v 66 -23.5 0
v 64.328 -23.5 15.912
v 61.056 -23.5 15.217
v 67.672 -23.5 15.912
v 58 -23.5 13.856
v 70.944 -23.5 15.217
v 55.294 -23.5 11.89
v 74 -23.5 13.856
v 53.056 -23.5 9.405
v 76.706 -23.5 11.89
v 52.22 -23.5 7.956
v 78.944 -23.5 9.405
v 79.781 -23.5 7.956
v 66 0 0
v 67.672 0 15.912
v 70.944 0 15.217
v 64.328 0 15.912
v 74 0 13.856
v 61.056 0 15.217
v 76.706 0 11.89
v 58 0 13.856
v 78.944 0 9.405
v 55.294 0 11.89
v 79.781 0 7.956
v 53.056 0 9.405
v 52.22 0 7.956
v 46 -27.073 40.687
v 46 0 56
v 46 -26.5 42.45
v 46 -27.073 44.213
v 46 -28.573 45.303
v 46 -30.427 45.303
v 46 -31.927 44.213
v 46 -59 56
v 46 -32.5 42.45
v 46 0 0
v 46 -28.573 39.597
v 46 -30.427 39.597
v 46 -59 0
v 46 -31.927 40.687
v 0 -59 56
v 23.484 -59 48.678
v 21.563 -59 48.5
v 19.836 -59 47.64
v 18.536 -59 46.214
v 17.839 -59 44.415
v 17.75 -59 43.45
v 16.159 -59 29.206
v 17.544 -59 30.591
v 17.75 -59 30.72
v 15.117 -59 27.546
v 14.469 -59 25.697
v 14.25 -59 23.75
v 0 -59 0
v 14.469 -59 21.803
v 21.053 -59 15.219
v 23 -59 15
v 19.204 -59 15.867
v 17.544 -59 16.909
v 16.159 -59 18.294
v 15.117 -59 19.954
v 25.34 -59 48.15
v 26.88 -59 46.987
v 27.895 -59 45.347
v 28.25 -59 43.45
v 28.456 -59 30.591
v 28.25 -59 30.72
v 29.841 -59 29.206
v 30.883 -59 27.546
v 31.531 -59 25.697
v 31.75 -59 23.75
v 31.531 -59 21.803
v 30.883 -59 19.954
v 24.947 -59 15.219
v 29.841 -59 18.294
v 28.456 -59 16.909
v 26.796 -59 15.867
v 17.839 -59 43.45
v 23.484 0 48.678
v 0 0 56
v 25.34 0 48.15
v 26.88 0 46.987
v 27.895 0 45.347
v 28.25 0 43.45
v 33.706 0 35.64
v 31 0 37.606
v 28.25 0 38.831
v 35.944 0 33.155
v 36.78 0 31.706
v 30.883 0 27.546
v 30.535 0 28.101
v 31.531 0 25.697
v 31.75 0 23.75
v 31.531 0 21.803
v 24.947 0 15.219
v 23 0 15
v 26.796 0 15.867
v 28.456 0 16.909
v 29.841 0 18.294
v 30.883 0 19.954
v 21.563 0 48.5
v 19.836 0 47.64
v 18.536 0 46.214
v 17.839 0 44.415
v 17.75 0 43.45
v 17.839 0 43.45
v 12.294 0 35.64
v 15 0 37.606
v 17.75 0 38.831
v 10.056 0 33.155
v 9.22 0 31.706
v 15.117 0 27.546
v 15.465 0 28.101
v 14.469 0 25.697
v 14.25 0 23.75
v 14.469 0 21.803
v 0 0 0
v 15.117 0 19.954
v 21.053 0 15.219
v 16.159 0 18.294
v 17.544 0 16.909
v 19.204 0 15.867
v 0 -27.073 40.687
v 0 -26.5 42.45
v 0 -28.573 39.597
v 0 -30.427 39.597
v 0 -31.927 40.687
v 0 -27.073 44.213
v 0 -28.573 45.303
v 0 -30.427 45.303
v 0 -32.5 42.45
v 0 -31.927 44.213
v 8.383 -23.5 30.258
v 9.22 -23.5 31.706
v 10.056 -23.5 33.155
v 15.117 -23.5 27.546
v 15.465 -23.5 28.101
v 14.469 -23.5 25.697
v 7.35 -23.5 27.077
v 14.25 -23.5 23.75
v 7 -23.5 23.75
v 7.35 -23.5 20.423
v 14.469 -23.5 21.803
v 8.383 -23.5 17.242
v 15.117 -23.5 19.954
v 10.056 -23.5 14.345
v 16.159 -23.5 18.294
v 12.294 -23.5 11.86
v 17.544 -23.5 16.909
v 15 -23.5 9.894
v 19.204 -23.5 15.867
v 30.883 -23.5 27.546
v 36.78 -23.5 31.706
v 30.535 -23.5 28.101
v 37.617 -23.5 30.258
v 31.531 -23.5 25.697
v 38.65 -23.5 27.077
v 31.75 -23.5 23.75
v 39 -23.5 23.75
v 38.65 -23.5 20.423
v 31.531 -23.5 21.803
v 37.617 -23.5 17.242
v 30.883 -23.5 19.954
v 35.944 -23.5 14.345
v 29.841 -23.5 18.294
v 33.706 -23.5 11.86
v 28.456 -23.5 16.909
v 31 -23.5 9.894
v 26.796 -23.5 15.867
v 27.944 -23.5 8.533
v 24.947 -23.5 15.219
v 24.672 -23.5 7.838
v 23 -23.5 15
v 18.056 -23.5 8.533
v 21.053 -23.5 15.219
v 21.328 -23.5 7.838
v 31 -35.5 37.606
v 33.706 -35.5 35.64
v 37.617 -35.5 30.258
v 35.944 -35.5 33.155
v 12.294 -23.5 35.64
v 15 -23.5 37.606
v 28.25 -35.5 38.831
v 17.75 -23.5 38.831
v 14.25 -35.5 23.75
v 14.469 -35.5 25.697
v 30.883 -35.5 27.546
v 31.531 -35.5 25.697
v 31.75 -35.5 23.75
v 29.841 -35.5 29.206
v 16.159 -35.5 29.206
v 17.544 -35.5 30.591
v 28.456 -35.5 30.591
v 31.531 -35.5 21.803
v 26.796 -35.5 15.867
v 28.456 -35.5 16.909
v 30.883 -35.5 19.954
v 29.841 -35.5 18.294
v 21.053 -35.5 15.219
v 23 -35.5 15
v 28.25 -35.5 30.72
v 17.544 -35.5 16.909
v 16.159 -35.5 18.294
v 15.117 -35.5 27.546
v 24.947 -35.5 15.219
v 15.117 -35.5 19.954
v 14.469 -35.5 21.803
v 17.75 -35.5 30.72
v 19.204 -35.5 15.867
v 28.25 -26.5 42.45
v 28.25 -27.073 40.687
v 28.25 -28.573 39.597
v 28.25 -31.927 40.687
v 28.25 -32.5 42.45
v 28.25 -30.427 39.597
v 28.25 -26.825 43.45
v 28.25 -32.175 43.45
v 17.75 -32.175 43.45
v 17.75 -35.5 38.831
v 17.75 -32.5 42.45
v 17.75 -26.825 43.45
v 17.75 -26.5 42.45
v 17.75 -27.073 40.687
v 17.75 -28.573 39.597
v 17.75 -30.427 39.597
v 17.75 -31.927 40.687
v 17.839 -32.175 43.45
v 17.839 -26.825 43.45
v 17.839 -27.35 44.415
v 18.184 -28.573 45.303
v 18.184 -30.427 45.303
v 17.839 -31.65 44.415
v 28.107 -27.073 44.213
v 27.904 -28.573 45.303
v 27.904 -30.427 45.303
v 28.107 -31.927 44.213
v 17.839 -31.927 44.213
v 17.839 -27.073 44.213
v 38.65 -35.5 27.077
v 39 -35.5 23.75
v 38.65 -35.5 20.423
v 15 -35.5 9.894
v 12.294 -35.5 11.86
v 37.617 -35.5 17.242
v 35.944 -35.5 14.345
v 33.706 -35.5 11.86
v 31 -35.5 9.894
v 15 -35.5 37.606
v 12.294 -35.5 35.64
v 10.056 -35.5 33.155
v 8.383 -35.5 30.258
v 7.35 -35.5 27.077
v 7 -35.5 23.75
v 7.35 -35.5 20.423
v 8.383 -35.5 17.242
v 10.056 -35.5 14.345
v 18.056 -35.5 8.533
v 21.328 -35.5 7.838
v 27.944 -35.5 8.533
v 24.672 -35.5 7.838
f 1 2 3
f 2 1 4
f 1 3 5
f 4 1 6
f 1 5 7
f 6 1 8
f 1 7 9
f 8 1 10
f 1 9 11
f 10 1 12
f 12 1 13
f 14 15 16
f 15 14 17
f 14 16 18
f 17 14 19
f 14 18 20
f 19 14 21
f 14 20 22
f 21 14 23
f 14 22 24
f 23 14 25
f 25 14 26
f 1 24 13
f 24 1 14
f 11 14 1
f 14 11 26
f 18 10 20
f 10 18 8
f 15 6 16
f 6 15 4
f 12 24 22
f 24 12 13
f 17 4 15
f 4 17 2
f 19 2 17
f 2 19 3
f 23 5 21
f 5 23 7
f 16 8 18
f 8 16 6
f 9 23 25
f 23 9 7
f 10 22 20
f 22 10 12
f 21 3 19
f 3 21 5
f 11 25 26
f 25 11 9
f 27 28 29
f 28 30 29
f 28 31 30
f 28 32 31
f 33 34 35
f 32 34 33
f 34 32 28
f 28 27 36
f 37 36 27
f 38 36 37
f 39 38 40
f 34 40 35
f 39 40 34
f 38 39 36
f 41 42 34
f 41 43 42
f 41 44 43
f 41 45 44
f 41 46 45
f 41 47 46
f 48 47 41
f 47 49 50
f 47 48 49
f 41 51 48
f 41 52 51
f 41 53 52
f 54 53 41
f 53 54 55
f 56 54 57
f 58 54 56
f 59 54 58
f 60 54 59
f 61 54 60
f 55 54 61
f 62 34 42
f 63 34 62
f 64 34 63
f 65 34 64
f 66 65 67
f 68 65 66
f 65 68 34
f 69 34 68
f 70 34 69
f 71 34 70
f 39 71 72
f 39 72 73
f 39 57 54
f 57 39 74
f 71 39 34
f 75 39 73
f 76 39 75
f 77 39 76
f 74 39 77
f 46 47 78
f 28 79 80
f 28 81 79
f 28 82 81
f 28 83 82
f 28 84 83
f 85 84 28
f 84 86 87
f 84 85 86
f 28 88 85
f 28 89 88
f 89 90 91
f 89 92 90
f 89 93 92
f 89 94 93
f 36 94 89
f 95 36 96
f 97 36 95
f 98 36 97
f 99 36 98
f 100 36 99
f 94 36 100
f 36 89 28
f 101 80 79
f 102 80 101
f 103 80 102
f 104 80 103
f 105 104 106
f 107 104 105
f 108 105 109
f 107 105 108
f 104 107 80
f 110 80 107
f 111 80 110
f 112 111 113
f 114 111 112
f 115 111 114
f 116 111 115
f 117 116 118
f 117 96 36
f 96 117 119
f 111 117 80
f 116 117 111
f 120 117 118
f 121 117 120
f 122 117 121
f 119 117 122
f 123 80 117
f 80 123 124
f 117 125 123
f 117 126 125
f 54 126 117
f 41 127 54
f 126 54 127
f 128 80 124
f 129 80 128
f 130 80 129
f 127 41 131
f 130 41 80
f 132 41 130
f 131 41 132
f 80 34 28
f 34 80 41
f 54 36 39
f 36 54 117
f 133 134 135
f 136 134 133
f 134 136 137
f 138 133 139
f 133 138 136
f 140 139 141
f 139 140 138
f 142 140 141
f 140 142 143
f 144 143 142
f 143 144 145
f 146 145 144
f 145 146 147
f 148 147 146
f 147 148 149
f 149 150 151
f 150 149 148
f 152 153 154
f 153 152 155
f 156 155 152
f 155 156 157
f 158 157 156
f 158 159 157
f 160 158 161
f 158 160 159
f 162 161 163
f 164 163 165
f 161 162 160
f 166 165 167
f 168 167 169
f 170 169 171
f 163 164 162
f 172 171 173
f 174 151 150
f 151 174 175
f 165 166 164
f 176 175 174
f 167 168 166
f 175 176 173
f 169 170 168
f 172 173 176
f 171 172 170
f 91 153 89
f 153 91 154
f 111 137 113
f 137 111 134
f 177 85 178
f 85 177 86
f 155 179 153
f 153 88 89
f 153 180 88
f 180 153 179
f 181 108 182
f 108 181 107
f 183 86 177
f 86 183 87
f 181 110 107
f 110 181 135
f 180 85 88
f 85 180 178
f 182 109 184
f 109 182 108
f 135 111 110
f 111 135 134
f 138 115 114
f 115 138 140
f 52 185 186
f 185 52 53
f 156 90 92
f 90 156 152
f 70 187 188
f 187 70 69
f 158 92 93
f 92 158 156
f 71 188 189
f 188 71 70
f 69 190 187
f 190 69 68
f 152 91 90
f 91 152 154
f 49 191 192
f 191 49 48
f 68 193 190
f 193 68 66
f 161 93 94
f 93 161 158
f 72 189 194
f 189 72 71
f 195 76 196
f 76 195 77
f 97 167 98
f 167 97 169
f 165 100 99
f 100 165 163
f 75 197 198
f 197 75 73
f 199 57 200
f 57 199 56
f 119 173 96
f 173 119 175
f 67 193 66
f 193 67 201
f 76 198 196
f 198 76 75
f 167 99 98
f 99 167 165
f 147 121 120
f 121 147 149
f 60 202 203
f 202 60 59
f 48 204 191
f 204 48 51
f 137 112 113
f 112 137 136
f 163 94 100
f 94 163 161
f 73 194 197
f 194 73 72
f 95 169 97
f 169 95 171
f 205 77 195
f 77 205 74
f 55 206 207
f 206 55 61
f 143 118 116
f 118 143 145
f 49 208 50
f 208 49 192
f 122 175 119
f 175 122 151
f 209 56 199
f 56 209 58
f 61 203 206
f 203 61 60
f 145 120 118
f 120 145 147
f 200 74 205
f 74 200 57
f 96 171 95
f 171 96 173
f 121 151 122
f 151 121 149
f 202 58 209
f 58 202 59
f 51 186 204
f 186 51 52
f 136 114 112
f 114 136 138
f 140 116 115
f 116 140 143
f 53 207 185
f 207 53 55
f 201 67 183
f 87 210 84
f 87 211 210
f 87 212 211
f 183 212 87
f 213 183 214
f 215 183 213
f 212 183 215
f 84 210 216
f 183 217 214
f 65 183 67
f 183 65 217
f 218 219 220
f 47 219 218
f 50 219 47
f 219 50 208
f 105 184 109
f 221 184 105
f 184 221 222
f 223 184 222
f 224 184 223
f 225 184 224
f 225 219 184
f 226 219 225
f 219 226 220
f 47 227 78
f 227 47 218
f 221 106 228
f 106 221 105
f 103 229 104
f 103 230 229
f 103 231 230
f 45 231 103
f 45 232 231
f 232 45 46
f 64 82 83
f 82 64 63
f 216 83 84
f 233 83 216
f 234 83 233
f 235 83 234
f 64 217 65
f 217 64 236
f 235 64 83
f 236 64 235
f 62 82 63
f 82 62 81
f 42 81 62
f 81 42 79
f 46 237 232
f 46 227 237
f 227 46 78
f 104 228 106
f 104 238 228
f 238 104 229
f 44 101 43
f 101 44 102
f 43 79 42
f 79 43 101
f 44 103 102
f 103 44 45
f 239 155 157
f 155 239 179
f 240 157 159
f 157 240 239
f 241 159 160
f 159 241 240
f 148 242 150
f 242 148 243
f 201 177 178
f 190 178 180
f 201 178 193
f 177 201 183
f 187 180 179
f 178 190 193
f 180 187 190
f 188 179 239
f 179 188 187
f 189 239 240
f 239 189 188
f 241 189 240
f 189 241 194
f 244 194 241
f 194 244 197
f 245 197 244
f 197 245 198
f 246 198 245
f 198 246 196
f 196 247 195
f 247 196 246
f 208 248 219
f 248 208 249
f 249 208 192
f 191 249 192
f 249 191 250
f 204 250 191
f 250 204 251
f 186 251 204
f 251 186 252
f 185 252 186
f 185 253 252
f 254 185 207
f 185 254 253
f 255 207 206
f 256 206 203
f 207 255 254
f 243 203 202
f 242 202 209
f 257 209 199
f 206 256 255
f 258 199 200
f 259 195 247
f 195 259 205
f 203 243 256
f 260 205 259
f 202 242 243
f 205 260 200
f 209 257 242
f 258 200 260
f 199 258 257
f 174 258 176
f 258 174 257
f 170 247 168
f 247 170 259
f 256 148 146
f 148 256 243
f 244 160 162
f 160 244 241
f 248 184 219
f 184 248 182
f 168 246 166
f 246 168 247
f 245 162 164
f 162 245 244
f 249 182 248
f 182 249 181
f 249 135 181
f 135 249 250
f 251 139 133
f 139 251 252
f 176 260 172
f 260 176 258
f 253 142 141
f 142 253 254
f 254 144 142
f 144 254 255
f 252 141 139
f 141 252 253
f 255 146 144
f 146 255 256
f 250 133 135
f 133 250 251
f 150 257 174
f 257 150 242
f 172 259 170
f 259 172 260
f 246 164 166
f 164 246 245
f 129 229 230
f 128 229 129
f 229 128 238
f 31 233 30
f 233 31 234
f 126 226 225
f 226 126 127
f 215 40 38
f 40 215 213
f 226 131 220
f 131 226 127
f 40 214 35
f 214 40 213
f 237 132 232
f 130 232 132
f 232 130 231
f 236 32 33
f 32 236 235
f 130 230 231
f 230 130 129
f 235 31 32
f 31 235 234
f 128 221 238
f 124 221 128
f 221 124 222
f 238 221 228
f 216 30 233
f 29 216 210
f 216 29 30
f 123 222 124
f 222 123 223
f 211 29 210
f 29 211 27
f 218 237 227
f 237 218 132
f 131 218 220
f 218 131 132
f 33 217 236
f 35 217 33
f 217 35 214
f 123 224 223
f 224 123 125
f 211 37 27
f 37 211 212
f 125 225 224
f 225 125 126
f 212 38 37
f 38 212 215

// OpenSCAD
// Units = mm

blockZ = 59;
blockX = 46;
blockY = 56;

//** REV7AB: 0.1mm clearance from nominal at each inside face, centered actuator box and moved it higher, made prisms bigger to avoid overhang
//** REV7AC: 0.15mm clearance from nominal at each inside face, moving the bottom edge of the actuator insertion box down a bit for more clearance near the sleeve
//** REV7AD: even more clearance for cylinder height, probably to account for extra filament being deposited by printing the bridge closure without support.
//** REV7AE: even more clearance needed to account for machine non-straightness and unexpectedly larger size of other cylinders (+1mm on each edge that touches the cylinder)
//** REV7AF: moving the screw mounting hole down a bit so it aligns with the thread of an inserted core.
//** REV7AG: cleaning up code
//** -------
//** REV7BA: changing the actuator insertion cutout to a sector of the inner actuator rotation space.

//keywayRadius = 8.75;    //*** REV 7A (8.5 nominal, actual core measures 8.4)
//keywayRadius = 8.6;    //*** REV 7AB
//keywayRadius = 8.65;    //*** REV 7AC
keywayRadius = 8.75;    //*** REV 7AE

actuatorLength = 12;
actuatorRadius = 16;

//profileRadius = 5.5;   //*** REV 7A (5.0 nominal, actual core measures 4.9)
//profileRadius = 5.5;   //*** REV 7AB
//profileRadius = 5.15;   //*** REV 7AC
profileRadius = 5.25;   //*** REV 7AE

//profileHeight = 34;    //*** REV 7A (33.0 nominal, actual core measures 32.9 at highest mutilated spot, probably machined to 32.8)
//profileHeight = 33.2;    //*** REV 7AB
//profileHeight = 33.3;    //*** REV 7AC
//profileHeight = 33.5;    //*** REV 7AD
profileHeight = 33.7;    //*** REV 7AE

M5ScrewR = 6/2;
M5ScrewHeadLen = 5;
M5ScrewHeadR = 9/2;

bottomOffset = 15;

module prism(l, w, h){
    polyhedron(
        points=[[0,0,0], [l,0,0], [l,w,0], [0,w,0], [0,w,h], [l,w,h]],
        faces=[[0,1,2,3],[5,4,3,2],[0,4,5,1],[0,3,4],[5,2,1]]
    );
    // preview unfolded (do not include in your function
    z = 0.08;
    separation = 2;
    border = .2;
    translate([0,w+separation,0])
        cube([l,w,z]);
    translate([0,w+separation+w+border,0])
        cube([l,h,z]);
    translate([0,w+separation+w+border+h+border,0])
        cube([l,sqrt(w*w+h*h),z]);
    translate([l+border,w+separation+w+border+h+border,0])
        polyhedron(
            points=[[0,0,0],[h,0,0],[0,sqrt(w*w+h*h),0], [0,0,z],[h,0,z],[0,sqrt(w*w+h*h),z]],
            faces=[[0,1,2], [3,5,4], [0,3,4,1], [1,4,5,2], [2,5,3,0]]
        );
    translate([0-border,w+separation+w+border+h+border,0])
        polyhedron(
            points=[[0,0,0],[0-h,0,0],[0,sqrt(w*w+h*h),0], [0,0,z],[0-h,0,z],[0,sqrt(w*w+h*h),z]],
            faces=[[1,0,2],[5,3,4],[0,1,4,3],[1,2,5,4],[2,0,3,5]]
        );
} // module prism

module sector(h, d, a1, a2) {
    if (a2 - a1 > 180) {
        difference() {
            cylinder(h=h, d=d);
            translate([0,0,-0.5]) sector(h+1, d+1, a2-360, a1); 
        }
    } else {
        difference() {
            cylinder(h=h, d=d);
            rotate([0,0,a1]) translate([-d/2, -d/2, -0.5])
                cube([d, d/2, h+1]);
            rotate([0,0,a2]) translate([-d/2, 0, -0.5])
                cube([d, d/2, h+1]);
        }
    }
} 

difference(){
    rotate(90,[1,0,0])
    difference(){
        // Outer Block
        union() {
            cube([blockX, blockY, blockZ]);
            translate([blockX+20, 0, 0])
            intersection(){
                cylinder(blockZ/2-actuatorLength/2, r=actuatorRadius);
                union(){
                    rotate([0,0,45-15]) 
                         cube([actuatorRadius,actuatorRadius,blockZ/2-actuatorLength/2]);
                    rotate([0,0,45+15]) 
                         cube([actuatorRadius,actuatorRadius,blockZ/2-actuatorLength/2]);
                }
            }

        }    

        // Profile:
        // Plug circle of profile face
        translate([blockX/2, keywayRadius+bottomOffset, 0])
            cylinder(h=blockZ, r1=keywayRadius, r2=keywayRadius, center=false);
        
        // Mid-section of profile face
        translate([blockX/2-profileRadius,keywayRadius+bottomOffset,0])
            cube([profileRadius*2, profileHeight-keywayRadius-profileRadius, blockZ], false);
    
        // Top arch of profile face
        translate([blockX/2, profileHeight+bottomOffset-profileRadius, 0])
            cylinder(h=blockZ, r1=profileRadius, r2=profileRadius, center=false);
    
        // inner cutout for actuator: enables full rotation of actuator/plug while lock is installed
        translate([blockX/2, keywayRadius+bottomOffset, blockZ/2])
            cylinder(h=actuatorLength, r1=actuatorRadius, r2=actuatorRadius, center=true);   
    
/*        // Slot for actuator insertion while locked  //*** Used to be in place for Rev 7A*, but replaced by different design in Rev 7B*
        difference() {
            //translate([blockX/2-(keywayRadius*2+8)/2, bottomOffset+12.5, 0])   //*** Rev 7AA
            //translate([blockX/2-(keywayRadius*2+6)/2, bottomOffset+12.5+2, 0])  //*** Rev 7AB: centering box, and moving it up a bit to avoid overhang
            translate([blockX/2-(keywayRadius*2+6)/2, bottomOffset+12.5+1, 0])  //***Rev 7AC: making box a bit higher and moving it down by the same amount, for better actuator clearance near the sleeve
                //cube([keywayRadius*2+6, 11, blockZ/2-actuatorLength/2]);  //***Rev 7AA
                cube([keywayRadius*2+6, 12, blockZ/2-actuatorLength/2]);  //***Rev 7AC: making box a bit higher and moving it down by the same amount, for better actuator clearance near the sleeve
        
            //translate([blockX/2-(keywayRadius*2+8)/2, bottomOffset+18.5, blockZ/2-actuatorLength/2]) //*** Rev 7AA
            translate([blockX/2-(keywayRadius*2+7)/2, bottomOffset+18.5, blockZ/2-actuatorLength/2])  //*** Rev 7AB: move prisms further out 
                rotate(90,[0,1,0])
                    //prism(blockZ/2-actuatorLength/2, 6, 6);  //*** REV 7AA
                    prism(blockZ/2-actuatorLength/2, 8, 8);  //*** REV 7AB: make prisms bigger to avoid overhang
        
            //translate([blockX/2+(keywayRadius*2+8)/2, bottomOffset+18.5, 0])  //*** REV 7AA
            translate([blockX/2+(keywayRadius*2+7)/2, bottomOffset+18.5, 0])  //*** Rev 7AB: move prisms further out
                rotate(270,[0,1,0])
                    //prism(blockZ/2-actuatorLength/2, 8, 8);  //*** Rev 7AA
                    prism(blockZ/2-actuatorLength/2, 8, 8);  //*** REV 7AB: make prisms bigger to avoid overhang
        } //difference
*/
        // New Slot for actuator insertion while locked   //*** Rev 7BA: matching a sector of the inner cutout for actuator rotation
        translate([blockX/2, keywayRadius+bottomOffset, 0])
            intersection(){
                cylinder(blockZ/2-actuatorLength/2, r=actuatorRadius);  //we take the same cylinder as for the inner cutout (albeit with simplified notation)...
                union(){                                                //but we intersect it with the union of two cubes that are rotated to form a 120 degree angle.
                    rotate([0,0,45-15]) 
                         cube([actuatorRadius,actuatorRadius,blockZ/2-actuatorLength/2]);
                    rotate([0,0,45+15]) 
                         cube([actuatorRadius,actuatorRadius,blockZ/2-actuatorLength/2]);
                }
            }


        //****TODO ABOVE: sector****
    
        // Mounting Screw hole
        //translate([-2, profileHeight+bottomOffset-profileRadius,(blockZ/2)])
        translate([-2, profileHeight+bottomOffset-profileRadius-1,(blockZ/2)])  //*** REV 7AF: moving the hole down a notch
            rotate(180, [1,0,1])
                cylinder(h=blockX+4, r1=M5ScrewR, r2=M5ScrewR, center=false);
    
        // Screw recess
        //translate([0, profileHeight+bottomOffset-profileRadius,(blockZ/2)])
            //rotate(180, [1,0,1])
                //cylinder(h=M5ScrewHeadLen, r1=M5ScrewHeadR, r2=M5ScrewHeadR, center=false);
    } //difference

    // Slice of actuator profile
    //translate([0,-6,0])
        //rotate(90,[1,0,0])
            //cube([blockX+1,blockY+2,blockZ]);

    // Slice of front profile
    //translate([0,1,0])
        //rotate(90,[1,0,0])
            //cube([blockX+1,blockY+2,blockZ-6]);

    // Rear Slice  //*** Rev 7AA: an upright slice of the rear profile for fitting. 
    //translate([0,-5,0])
        //rotate(90,[1,0,0])
            //cube([blockX,blockY+2,blockZ+1]);
} //difference
